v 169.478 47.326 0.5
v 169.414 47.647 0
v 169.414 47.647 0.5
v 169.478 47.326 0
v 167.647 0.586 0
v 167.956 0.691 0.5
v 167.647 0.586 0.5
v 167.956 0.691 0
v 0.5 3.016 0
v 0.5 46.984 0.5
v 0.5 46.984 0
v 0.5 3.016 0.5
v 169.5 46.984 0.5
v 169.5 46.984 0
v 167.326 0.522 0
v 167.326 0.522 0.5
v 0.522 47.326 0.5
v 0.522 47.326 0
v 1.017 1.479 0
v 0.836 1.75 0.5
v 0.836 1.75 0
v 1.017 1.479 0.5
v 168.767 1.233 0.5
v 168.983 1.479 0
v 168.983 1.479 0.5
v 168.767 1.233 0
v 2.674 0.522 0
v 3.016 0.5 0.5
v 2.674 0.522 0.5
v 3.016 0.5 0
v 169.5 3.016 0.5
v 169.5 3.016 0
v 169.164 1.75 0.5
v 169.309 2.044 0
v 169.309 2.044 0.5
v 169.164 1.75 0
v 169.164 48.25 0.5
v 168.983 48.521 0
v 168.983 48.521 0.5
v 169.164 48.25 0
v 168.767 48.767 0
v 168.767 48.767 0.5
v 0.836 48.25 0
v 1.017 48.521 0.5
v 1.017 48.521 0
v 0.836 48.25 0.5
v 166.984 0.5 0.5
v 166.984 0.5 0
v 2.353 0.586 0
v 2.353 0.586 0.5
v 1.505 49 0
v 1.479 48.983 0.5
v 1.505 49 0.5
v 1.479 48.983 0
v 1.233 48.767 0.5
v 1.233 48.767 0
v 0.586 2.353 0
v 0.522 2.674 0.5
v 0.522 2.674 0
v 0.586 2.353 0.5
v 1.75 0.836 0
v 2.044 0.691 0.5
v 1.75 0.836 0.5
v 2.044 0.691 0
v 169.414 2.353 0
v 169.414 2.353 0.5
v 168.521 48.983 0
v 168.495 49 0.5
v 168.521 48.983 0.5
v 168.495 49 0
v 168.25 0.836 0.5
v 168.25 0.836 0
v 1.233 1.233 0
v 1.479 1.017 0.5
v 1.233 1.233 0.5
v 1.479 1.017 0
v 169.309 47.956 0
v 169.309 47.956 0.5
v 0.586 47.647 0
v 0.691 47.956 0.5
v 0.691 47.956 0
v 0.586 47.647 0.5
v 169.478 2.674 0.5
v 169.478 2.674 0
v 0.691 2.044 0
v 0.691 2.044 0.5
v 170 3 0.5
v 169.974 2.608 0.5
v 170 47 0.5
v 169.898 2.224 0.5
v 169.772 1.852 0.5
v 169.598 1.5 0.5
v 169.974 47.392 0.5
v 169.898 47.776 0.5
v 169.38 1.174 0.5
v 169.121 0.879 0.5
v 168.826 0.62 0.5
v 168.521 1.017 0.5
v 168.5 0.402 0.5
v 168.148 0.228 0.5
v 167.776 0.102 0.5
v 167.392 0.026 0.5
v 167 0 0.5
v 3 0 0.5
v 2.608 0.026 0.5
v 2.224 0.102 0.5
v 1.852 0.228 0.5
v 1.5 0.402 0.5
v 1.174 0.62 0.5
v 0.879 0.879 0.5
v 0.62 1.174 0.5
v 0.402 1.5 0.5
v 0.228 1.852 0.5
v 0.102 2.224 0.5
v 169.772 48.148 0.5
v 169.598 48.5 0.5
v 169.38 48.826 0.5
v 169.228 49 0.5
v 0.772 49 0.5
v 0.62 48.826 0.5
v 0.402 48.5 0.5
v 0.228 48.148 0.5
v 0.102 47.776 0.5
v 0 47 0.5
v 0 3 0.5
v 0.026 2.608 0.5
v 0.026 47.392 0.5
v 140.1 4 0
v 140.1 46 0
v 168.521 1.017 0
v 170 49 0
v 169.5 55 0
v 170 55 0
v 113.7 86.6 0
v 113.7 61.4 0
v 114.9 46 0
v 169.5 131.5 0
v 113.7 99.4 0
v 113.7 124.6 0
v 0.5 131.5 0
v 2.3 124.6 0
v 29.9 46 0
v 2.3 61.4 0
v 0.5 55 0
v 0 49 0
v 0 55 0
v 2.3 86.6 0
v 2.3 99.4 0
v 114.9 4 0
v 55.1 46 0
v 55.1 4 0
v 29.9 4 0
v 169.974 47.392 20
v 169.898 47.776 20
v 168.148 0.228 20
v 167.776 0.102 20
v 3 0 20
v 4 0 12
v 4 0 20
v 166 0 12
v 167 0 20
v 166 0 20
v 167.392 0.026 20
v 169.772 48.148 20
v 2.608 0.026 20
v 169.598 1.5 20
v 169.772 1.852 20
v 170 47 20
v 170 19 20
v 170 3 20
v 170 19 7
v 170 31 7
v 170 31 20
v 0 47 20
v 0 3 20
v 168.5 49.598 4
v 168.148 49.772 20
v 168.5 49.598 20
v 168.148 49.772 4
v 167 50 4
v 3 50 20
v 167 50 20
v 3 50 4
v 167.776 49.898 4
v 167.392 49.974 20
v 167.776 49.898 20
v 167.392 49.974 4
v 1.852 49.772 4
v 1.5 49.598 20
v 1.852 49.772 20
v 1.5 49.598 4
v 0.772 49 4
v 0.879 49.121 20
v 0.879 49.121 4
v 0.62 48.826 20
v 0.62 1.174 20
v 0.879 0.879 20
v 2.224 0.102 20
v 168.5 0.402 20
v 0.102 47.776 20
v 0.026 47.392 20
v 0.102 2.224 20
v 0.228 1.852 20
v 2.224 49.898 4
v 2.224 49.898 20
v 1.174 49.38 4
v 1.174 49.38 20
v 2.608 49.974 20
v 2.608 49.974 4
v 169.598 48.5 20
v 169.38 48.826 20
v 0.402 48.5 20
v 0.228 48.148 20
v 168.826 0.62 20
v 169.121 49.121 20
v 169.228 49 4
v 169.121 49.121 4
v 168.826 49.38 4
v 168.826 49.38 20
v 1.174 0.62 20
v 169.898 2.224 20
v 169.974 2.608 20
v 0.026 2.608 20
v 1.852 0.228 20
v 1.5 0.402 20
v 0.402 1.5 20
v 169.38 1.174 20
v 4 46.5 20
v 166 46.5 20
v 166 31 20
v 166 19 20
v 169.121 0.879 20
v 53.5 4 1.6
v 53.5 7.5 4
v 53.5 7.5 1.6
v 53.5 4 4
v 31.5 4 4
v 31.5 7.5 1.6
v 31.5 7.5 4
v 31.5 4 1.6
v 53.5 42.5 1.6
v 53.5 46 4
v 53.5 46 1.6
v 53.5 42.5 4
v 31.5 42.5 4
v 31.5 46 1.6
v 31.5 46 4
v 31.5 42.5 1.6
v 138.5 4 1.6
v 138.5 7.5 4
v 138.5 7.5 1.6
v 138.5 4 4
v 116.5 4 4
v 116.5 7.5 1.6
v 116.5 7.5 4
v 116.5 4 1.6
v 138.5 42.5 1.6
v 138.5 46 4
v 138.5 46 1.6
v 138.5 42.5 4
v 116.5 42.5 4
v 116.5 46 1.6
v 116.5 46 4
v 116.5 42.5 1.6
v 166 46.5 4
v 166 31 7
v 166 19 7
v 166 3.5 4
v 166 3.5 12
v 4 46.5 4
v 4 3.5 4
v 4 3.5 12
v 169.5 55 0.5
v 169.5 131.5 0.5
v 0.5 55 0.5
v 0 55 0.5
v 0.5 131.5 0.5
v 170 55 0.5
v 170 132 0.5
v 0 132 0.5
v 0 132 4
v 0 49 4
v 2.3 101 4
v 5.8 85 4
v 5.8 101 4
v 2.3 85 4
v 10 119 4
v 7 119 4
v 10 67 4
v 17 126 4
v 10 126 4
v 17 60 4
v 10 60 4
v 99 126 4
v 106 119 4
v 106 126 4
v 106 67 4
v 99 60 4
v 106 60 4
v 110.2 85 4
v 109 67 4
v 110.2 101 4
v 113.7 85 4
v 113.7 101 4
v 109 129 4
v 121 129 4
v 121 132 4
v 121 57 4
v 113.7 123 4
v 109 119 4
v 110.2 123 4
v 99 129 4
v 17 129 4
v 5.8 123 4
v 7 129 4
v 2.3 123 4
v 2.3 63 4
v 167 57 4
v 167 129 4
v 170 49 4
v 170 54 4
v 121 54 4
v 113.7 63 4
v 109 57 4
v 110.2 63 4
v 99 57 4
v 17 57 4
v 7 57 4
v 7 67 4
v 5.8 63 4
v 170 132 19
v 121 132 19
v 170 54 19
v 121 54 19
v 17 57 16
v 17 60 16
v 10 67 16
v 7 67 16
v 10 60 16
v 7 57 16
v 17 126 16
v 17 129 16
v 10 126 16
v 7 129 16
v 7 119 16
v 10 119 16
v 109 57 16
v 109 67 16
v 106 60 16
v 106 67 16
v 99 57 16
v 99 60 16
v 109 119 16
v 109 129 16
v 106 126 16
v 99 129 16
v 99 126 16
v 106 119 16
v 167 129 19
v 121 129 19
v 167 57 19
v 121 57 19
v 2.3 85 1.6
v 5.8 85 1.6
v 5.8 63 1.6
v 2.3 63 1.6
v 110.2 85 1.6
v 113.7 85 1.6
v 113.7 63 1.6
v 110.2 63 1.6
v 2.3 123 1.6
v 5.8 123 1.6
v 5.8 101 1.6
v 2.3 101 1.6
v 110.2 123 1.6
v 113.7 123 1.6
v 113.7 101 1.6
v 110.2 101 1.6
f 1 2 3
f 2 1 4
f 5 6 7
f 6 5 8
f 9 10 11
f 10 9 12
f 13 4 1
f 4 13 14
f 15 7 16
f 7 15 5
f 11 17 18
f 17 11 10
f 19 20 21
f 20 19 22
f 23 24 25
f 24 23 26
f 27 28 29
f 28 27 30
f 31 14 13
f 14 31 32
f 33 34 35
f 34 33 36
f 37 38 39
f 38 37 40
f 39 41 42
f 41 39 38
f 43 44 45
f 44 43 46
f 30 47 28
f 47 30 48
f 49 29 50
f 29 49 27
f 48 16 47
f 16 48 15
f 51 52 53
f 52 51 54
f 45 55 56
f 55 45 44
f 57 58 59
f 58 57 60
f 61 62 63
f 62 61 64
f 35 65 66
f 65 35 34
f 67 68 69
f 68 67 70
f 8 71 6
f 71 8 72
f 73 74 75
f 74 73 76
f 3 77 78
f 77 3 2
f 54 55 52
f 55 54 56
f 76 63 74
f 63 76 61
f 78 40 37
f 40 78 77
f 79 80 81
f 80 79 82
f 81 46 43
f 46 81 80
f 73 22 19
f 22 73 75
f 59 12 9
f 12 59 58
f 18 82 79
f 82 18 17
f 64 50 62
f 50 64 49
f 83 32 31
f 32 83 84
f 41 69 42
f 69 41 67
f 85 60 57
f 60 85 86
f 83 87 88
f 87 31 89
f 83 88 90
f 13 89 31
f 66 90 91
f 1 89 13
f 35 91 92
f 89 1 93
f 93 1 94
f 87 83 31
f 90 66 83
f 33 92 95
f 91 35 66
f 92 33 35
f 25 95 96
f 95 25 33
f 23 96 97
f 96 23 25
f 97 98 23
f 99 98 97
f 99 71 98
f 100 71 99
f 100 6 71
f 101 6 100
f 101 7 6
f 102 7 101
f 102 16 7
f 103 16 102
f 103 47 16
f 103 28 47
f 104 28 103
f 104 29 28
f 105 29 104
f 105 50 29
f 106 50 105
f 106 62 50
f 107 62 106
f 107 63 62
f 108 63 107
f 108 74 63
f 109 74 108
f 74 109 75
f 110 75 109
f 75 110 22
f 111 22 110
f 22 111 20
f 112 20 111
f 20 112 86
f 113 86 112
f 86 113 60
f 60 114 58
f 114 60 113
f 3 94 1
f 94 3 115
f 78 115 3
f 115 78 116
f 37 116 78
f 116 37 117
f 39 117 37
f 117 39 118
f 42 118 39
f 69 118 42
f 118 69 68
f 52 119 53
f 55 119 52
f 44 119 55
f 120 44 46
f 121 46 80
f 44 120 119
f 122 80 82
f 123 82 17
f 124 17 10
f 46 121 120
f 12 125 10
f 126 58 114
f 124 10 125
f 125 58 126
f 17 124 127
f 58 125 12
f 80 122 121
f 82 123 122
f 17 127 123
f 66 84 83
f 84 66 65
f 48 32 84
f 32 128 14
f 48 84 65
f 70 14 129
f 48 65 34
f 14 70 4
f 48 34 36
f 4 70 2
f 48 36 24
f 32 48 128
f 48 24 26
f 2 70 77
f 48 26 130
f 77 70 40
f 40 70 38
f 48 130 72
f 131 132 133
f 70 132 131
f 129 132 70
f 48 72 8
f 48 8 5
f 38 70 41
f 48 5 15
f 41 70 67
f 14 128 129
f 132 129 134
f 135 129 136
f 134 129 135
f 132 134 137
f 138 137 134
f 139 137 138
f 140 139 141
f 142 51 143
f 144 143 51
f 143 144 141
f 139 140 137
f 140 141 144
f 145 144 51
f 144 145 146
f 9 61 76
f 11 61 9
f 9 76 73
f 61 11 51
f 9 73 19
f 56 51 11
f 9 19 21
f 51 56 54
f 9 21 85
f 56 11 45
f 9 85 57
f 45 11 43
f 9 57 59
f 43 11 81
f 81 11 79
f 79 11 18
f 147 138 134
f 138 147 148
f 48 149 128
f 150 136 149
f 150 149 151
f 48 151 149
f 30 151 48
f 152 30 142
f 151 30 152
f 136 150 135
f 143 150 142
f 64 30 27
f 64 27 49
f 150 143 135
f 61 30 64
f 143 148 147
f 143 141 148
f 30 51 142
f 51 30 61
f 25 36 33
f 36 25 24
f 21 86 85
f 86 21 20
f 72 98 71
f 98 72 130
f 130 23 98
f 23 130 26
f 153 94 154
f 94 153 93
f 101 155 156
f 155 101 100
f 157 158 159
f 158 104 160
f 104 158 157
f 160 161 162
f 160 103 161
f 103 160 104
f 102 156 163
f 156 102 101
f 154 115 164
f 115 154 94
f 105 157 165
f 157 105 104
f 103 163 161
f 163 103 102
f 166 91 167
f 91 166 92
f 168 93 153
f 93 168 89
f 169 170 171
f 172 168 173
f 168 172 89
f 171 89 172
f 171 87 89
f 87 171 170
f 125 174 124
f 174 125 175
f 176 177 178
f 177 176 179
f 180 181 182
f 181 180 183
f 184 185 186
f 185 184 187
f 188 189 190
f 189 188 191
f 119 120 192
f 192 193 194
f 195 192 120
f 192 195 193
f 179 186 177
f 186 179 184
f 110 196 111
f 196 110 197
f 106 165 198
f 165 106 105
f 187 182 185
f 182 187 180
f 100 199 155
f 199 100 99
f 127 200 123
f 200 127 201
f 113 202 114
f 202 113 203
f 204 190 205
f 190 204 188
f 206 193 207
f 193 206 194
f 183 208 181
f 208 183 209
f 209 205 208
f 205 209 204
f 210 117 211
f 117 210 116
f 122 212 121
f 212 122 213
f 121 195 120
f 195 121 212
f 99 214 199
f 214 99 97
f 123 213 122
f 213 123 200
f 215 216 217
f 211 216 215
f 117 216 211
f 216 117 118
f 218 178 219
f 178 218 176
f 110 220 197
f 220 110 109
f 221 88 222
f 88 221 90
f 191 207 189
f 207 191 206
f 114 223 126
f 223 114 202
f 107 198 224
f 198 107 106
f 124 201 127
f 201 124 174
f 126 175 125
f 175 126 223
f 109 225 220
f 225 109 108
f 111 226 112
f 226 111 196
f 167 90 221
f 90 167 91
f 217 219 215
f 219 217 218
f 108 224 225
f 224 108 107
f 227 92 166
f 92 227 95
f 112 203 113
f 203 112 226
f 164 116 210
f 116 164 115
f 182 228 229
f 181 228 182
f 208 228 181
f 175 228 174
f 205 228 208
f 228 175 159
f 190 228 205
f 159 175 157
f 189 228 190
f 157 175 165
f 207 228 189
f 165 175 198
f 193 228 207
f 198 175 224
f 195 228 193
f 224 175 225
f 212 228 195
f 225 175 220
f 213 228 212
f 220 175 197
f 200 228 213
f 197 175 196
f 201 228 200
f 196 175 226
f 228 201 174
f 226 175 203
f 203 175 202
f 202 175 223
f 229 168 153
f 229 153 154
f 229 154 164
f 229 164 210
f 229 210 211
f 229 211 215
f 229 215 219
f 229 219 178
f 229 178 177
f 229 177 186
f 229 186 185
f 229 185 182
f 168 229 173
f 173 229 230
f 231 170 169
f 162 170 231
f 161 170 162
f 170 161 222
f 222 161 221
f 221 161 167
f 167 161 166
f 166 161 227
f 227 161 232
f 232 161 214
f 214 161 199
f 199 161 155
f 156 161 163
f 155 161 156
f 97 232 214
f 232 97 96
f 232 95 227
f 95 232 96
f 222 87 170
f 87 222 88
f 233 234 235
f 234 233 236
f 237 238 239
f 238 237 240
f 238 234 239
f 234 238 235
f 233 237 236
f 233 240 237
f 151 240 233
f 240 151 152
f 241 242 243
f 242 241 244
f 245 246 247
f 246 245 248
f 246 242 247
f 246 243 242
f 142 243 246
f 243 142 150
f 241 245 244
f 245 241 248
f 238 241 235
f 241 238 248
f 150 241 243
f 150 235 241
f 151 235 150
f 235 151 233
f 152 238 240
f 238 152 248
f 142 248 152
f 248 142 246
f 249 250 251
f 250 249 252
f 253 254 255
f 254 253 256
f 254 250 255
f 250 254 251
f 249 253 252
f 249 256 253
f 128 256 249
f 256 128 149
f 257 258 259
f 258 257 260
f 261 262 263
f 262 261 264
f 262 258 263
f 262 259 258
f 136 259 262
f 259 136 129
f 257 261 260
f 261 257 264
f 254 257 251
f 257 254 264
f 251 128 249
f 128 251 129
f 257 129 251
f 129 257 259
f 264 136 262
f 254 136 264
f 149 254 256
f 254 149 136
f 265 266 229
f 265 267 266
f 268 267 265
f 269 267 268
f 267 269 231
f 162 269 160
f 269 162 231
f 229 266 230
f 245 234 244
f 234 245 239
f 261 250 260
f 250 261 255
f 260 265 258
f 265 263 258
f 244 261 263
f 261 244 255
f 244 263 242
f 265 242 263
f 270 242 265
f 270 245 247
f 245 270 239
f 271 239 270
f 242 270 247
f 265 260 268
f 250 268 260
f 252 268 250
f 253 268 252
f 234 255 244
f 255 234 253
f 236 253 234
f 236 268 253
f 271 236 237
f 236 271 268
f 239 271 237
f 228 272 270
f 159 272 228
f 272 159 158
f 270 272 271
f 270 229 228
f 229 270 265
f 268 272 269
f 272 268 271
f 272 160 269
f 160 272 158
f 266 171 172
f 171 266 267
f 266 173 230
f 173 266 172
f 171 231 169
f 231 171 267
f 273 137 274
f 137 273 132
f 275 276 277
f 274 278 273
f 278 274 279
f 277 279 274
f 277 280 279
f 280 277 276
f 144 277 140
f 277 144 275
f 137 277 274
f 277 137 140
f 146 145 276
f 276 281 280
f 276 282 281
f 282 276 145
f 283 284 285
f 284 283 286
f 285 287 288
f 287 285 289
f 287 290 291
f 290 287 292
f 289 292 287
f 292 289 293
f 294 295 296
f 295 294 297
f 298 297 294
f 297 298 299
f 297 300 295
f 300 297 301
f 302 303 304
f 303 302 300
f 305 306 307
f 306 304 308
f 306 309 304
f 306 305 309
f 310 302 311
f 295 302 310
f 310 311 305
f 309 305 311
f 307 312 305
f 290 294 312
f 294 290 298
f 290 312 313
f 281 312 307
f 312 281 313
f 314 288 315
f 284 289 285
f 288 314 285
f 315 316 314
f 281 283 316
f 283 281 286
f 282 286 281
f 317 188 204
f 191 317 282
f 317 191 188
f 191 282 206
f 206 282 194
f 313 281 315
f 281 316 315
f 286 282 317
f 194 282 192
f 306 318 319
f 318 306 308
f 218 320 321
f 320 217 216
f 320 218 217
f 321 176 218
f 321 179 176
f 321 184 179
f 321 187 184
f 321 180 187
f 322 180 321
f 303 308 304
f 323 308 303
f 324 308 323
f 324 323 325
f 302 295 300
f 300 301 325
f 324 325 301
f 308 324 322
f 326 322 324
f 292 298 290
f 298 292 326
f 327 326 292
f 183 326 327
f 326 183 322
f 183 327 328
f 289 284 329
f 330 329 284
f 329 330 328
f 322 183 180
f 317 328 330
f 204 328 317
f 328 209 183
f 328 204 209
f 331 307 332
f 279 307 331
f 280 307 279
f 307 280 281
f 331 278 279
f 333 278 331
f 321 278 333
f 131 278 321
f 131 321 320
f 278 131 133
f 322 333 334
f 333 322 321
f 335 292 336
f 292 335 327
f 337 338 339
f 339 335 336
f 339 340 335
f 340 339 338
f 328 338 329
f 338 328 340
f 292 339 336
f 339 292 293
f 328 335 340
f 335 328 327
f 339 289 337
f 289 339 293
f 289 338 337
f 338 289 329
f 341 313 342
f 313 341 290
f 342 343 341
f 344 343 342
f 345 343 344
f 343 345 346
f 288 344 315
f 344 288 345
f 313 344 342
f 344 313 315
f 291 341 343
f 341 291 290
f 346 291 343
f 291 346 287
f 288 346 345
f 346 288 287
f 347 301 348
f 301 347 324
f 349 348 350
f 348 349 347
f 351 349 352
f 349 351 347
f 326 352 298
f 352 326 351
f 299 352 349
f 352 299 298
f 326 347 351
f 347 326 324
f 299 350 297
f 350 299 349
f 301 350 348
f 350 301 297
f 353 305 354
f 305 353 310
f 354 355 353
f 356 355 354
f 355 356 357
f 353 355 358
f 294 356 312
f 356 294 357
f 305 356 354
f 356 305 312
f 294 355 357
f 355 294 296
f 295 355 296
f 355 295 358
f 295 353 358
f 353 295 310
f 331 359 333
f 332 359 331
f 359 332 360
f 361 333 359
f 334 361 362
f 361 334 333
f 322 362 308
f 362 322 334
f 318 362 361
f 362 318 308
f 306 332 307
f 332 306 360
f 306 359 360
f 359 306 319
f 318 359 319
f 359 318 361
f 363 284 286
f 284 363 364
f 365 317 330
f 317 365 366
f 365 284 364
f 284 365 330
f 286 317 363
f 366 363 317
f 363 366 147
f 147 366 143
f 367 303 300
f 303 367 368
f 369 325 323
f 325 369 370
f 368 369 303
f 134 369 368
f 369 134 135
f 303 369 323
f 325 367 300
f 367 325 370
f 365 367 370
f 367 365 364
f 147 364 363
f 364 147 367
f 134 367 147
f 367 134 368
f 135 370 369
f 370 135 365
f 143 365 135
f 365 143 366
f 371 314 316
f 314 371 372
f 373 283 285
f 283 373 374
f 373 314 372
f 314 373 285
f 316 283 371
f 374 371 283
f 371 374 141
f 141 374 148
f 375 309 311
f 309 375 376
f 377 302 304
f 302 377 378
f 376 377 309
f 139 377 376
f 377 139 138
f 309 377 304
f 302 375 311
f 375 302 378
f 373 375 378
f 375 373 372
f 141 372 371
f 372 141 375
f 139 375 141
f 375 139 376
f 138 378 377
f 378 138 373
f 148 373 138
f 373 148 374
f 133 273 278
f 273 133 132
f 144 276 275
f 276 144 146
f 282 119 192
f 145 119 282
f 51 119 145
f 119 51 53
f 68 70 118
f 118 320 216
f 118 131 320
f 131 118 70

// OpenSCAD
// file: params.scad
// ===========================================================================
//  Apache 4800 cyberdeck v2 - shared parameters (all mm)
//  Every part file includes this through parts.scad.
//  Values marked [CHECK] are defaults from the spec: measure the real part and
//  change them here, then run build.cmd again to re-export every STL.
// ===========================================================================

// ---- printer limits --------------------------------------------------------
bed_max    = 175;      // max footprint X and Y
height_max = 150;

// ---- case: Harbor Freight Apache 4800 ---------------------------------------
case_in      = [454, 327];  // interior at the rim (listed)
tray         = [444, 312];  // [CHECK] printed tray outline = floor at the very bottom
tray_r       = 20;          // [CHECK] inside corner radius
base_depth   = 115;         // [CHECK] floor to rim
lid_depth    = 44;          // [CHECK]
height_limit = 100;         // nothing in the base taller than this above the floor

// ---- floor tiles (3 x 2) -----------------------------------------------------
tile_cols = 3;
tile_rows = 2;
tile_t    = 4;
tile_gap  = 0.4;                       // total gap between neighbouring tiles
tile_sz   = [tray[0] / tile_cols, tray[1] / tile_rows];   // 148 x 156
vent_sz     = 15;
vent_pitch  = 25;
vent_margin = 8;                       // keep vents this far from tile edges
chamfer     = 0.5;                     // bottom-edge chamfer (elephant foot)

// ---- tile joints (dovetail tabs printed on the tiles - no loose keys) -------
tab_neck  = 10;      // width where the tab leaves its tile
tab_head  = 16;      // width at the tip (wider = locks)
tab_len   = 10;      // how far it reaches into the next tile
tab_clear = 0.2;     // gap around the tab in the socket (per side); raise if too tight

// ---- Velcro straps ------------------------------------------------------------
strap_w      = 22;   // slot length (20 mm strap + room)
strap_slot_t = 3.5;  // slot width
strap_groove = 1.6;  // groove depth under a floor for the strap (leaves >= 2.4 mm of floor)

// ---- layout (top view; origin = front-left of tray, X right, Y to hinge) ----
// [x0, y0, x1, y1]
hub_box    = [75,   6, 245,  56];
pi_box     = [75,  60, 245, 138];
power_box  = [75, 142, 245, 282];
switch_box = [2.5, 12.5, 72.5, 117.5];
signal_lane = [0, 286, tray[0], 298];
power_lane  = [0, 300, tray[0], 312];

// ---- the PC: Minisforum UM870 Slim (names still say k12 so nothing else breaks) ----
k12      = [130, 126.5, 50.4];    // listed (was GMKtec K12: 154 x 151 x 73.6)
k12_pos  = [266, 40];             // front-left corner on the tray (same spot as the K12)
// [CHECK] open air behind the PC: assumes it blows hot air out the back.
// Once the UM870 is here, check where its vents really are.
rear_air = [k12_pos[0], k12_pos[1] + k12[1], 420, 286];
plinth_margin = 8;
plinth_h      = 15;
plinth_rim    = 8;                // solid border: corner guides sit fully on it
hex_cell      = 10;               // across flats
hex_wall      = 2;
plinth_post_front_h = 20;         // above the honeycomb
plinth_post_rear_h  = 10;         // keep the rear exhaust clear (spec: <= 10)
plinth_post_leg     = 15;
plinth_post_t       = 3;
k12_clear           = 1;
plinth_box = [k12_pos[0] - plinth_margin, k12_pos[1] - plinth_margin,
              k12_pos[0] + k12[0] + plinth_margin, k12_pos[1] + k12[1] + plinth_margin];

// ---- USB hub (Vantisan) -----------------------------------------------------------
hub      = [161, 42, 25];        // measured
hub_fit  = 1;                    // clearance (total)
hub_wall_h       = 16;           // back/side walls above the floor
hub_front_wall_h = 8;            // [CHECK] low front wall: ports face up/front
hub_floor        = 4;
hub_cable_end    = "right";      // cable exit notch end: "right" (toward the PC) or "left"

// ---- Raspberry Pi 5 in CanaKit case ------------------------------------------------
pi_case   = [95, 65, 30];        // measured (height est.)
pi_fit    = 1;
pi_floor  = 4;
pi_guide_h  = 12;
pi_vent_gap = 15;                // open space between Pi and the cable cubby
cubby_wall_h = 15;

// ---- power bay ------------------------------------------------------------------
brick  = [150, 65, 35];          // [CHECK] PC 120 W brick (UM870: 19 V / 6.32 A) - measure it
strip  = [130, 60, 40];          // [CHECK] compact 3-outlet surge strip
power_floor  = 4;
power_wall_h = 30;               // above the floor
power_wall_t = 3;
brick_rib_h  = 4;                // air gap under the brick

// ---- network switch -----------------------------------------------------------------
switch_sz   = [65, 100, 25];     // [CHECK] (X = width, Y = length, ports at back)
switch_fit  = 1;
switch_floor  = 4;
switch_wall_h = 12;

// ---- cable lanes ---------------------------------------------------------------------
rib_h      = 10;
rib_t      = 2.4;
rib_foot_w = 8;
rib_foot_t = 2;
rib_y      = 299;                // centre line between the lanes
comb_w     = 20;                 // comb thickness along the lane

// ---- left-wall side panel -------------------------------------------------------------
panel      = [150, 60];
panel_outer_t = 4;
panel_inner_t = 3;
wall_cutout   = [135, 42];       // [CHECK] must sit inside the flat area of the wall
panel_y_center = 215;            // along the case wall (tray Y)
keystone_hole  = [14.5, 16.0];   // print keystone_test.stl first and adjust
keystone_relief = [17.5, 24];    // back-side pocket so the latch sees a thin plate
keystone_latch_t = 2.0;          // plate thickness where the keystone clips on
keystone_pitch = 19.5;
// Power entry: "iec" = snap-in C14 inlet (recommended - see README) or "slot" = cord slot
power_entry  = "iec";
iec_hole     = [27.5, 19.8];     // [CHECK] snap-in C14 inlet cutout
iec_relief   = [31, 24];
iec_latch_t  = 2.0;
cord_slot    = [25, 12];
m4_hole      = 4.3;
labels = ["LAN", "PC", "MIC", "AUD", "USB", "PWR"];
cover_clear  = 9;                // room in front of the plate for couplers/bolt heads

// ---- lid monitor clips (ViewSonic VA1655) ------------------------------------------------
monitor     = [359, 227];        // listed (spec value used; re-measure the width)
mon_thick   = 20;                // thick edge (measured)
mon_thin    = 10;                // thin edge (measured)
thick_edge  = "bottom";          // [CHECK] "bottom" = hinge side when the lid is open
foam_t      = 1.5;               // foam on every face touching the monitor
clip_wall_t = 3;
clip_lip    = 3;                 // overlap onto the bezel only
clip_lip_t  = 2.5;
clip_buttress = 12;              // VHB foot width outside the wall
clip_leg    = 45;                // leg length along the monitor edge, from the corner
clip_port_leg = 20;              // [CHECK] shorter leg along the RIGHT edge (port zone)

// ---- print settings reference (set these in the slicer) ---------------------------------
// 0.4 nozzle, 0.2 layers, 4 walls, 25-30% gyroid
// holes already include +0.3 mm
$fn = 48;
// main file
// USB hub holder + Raspberry Pi 5 cradle as one part (middle column, front).
include <parts.scad>
hub_pi_cradle();
